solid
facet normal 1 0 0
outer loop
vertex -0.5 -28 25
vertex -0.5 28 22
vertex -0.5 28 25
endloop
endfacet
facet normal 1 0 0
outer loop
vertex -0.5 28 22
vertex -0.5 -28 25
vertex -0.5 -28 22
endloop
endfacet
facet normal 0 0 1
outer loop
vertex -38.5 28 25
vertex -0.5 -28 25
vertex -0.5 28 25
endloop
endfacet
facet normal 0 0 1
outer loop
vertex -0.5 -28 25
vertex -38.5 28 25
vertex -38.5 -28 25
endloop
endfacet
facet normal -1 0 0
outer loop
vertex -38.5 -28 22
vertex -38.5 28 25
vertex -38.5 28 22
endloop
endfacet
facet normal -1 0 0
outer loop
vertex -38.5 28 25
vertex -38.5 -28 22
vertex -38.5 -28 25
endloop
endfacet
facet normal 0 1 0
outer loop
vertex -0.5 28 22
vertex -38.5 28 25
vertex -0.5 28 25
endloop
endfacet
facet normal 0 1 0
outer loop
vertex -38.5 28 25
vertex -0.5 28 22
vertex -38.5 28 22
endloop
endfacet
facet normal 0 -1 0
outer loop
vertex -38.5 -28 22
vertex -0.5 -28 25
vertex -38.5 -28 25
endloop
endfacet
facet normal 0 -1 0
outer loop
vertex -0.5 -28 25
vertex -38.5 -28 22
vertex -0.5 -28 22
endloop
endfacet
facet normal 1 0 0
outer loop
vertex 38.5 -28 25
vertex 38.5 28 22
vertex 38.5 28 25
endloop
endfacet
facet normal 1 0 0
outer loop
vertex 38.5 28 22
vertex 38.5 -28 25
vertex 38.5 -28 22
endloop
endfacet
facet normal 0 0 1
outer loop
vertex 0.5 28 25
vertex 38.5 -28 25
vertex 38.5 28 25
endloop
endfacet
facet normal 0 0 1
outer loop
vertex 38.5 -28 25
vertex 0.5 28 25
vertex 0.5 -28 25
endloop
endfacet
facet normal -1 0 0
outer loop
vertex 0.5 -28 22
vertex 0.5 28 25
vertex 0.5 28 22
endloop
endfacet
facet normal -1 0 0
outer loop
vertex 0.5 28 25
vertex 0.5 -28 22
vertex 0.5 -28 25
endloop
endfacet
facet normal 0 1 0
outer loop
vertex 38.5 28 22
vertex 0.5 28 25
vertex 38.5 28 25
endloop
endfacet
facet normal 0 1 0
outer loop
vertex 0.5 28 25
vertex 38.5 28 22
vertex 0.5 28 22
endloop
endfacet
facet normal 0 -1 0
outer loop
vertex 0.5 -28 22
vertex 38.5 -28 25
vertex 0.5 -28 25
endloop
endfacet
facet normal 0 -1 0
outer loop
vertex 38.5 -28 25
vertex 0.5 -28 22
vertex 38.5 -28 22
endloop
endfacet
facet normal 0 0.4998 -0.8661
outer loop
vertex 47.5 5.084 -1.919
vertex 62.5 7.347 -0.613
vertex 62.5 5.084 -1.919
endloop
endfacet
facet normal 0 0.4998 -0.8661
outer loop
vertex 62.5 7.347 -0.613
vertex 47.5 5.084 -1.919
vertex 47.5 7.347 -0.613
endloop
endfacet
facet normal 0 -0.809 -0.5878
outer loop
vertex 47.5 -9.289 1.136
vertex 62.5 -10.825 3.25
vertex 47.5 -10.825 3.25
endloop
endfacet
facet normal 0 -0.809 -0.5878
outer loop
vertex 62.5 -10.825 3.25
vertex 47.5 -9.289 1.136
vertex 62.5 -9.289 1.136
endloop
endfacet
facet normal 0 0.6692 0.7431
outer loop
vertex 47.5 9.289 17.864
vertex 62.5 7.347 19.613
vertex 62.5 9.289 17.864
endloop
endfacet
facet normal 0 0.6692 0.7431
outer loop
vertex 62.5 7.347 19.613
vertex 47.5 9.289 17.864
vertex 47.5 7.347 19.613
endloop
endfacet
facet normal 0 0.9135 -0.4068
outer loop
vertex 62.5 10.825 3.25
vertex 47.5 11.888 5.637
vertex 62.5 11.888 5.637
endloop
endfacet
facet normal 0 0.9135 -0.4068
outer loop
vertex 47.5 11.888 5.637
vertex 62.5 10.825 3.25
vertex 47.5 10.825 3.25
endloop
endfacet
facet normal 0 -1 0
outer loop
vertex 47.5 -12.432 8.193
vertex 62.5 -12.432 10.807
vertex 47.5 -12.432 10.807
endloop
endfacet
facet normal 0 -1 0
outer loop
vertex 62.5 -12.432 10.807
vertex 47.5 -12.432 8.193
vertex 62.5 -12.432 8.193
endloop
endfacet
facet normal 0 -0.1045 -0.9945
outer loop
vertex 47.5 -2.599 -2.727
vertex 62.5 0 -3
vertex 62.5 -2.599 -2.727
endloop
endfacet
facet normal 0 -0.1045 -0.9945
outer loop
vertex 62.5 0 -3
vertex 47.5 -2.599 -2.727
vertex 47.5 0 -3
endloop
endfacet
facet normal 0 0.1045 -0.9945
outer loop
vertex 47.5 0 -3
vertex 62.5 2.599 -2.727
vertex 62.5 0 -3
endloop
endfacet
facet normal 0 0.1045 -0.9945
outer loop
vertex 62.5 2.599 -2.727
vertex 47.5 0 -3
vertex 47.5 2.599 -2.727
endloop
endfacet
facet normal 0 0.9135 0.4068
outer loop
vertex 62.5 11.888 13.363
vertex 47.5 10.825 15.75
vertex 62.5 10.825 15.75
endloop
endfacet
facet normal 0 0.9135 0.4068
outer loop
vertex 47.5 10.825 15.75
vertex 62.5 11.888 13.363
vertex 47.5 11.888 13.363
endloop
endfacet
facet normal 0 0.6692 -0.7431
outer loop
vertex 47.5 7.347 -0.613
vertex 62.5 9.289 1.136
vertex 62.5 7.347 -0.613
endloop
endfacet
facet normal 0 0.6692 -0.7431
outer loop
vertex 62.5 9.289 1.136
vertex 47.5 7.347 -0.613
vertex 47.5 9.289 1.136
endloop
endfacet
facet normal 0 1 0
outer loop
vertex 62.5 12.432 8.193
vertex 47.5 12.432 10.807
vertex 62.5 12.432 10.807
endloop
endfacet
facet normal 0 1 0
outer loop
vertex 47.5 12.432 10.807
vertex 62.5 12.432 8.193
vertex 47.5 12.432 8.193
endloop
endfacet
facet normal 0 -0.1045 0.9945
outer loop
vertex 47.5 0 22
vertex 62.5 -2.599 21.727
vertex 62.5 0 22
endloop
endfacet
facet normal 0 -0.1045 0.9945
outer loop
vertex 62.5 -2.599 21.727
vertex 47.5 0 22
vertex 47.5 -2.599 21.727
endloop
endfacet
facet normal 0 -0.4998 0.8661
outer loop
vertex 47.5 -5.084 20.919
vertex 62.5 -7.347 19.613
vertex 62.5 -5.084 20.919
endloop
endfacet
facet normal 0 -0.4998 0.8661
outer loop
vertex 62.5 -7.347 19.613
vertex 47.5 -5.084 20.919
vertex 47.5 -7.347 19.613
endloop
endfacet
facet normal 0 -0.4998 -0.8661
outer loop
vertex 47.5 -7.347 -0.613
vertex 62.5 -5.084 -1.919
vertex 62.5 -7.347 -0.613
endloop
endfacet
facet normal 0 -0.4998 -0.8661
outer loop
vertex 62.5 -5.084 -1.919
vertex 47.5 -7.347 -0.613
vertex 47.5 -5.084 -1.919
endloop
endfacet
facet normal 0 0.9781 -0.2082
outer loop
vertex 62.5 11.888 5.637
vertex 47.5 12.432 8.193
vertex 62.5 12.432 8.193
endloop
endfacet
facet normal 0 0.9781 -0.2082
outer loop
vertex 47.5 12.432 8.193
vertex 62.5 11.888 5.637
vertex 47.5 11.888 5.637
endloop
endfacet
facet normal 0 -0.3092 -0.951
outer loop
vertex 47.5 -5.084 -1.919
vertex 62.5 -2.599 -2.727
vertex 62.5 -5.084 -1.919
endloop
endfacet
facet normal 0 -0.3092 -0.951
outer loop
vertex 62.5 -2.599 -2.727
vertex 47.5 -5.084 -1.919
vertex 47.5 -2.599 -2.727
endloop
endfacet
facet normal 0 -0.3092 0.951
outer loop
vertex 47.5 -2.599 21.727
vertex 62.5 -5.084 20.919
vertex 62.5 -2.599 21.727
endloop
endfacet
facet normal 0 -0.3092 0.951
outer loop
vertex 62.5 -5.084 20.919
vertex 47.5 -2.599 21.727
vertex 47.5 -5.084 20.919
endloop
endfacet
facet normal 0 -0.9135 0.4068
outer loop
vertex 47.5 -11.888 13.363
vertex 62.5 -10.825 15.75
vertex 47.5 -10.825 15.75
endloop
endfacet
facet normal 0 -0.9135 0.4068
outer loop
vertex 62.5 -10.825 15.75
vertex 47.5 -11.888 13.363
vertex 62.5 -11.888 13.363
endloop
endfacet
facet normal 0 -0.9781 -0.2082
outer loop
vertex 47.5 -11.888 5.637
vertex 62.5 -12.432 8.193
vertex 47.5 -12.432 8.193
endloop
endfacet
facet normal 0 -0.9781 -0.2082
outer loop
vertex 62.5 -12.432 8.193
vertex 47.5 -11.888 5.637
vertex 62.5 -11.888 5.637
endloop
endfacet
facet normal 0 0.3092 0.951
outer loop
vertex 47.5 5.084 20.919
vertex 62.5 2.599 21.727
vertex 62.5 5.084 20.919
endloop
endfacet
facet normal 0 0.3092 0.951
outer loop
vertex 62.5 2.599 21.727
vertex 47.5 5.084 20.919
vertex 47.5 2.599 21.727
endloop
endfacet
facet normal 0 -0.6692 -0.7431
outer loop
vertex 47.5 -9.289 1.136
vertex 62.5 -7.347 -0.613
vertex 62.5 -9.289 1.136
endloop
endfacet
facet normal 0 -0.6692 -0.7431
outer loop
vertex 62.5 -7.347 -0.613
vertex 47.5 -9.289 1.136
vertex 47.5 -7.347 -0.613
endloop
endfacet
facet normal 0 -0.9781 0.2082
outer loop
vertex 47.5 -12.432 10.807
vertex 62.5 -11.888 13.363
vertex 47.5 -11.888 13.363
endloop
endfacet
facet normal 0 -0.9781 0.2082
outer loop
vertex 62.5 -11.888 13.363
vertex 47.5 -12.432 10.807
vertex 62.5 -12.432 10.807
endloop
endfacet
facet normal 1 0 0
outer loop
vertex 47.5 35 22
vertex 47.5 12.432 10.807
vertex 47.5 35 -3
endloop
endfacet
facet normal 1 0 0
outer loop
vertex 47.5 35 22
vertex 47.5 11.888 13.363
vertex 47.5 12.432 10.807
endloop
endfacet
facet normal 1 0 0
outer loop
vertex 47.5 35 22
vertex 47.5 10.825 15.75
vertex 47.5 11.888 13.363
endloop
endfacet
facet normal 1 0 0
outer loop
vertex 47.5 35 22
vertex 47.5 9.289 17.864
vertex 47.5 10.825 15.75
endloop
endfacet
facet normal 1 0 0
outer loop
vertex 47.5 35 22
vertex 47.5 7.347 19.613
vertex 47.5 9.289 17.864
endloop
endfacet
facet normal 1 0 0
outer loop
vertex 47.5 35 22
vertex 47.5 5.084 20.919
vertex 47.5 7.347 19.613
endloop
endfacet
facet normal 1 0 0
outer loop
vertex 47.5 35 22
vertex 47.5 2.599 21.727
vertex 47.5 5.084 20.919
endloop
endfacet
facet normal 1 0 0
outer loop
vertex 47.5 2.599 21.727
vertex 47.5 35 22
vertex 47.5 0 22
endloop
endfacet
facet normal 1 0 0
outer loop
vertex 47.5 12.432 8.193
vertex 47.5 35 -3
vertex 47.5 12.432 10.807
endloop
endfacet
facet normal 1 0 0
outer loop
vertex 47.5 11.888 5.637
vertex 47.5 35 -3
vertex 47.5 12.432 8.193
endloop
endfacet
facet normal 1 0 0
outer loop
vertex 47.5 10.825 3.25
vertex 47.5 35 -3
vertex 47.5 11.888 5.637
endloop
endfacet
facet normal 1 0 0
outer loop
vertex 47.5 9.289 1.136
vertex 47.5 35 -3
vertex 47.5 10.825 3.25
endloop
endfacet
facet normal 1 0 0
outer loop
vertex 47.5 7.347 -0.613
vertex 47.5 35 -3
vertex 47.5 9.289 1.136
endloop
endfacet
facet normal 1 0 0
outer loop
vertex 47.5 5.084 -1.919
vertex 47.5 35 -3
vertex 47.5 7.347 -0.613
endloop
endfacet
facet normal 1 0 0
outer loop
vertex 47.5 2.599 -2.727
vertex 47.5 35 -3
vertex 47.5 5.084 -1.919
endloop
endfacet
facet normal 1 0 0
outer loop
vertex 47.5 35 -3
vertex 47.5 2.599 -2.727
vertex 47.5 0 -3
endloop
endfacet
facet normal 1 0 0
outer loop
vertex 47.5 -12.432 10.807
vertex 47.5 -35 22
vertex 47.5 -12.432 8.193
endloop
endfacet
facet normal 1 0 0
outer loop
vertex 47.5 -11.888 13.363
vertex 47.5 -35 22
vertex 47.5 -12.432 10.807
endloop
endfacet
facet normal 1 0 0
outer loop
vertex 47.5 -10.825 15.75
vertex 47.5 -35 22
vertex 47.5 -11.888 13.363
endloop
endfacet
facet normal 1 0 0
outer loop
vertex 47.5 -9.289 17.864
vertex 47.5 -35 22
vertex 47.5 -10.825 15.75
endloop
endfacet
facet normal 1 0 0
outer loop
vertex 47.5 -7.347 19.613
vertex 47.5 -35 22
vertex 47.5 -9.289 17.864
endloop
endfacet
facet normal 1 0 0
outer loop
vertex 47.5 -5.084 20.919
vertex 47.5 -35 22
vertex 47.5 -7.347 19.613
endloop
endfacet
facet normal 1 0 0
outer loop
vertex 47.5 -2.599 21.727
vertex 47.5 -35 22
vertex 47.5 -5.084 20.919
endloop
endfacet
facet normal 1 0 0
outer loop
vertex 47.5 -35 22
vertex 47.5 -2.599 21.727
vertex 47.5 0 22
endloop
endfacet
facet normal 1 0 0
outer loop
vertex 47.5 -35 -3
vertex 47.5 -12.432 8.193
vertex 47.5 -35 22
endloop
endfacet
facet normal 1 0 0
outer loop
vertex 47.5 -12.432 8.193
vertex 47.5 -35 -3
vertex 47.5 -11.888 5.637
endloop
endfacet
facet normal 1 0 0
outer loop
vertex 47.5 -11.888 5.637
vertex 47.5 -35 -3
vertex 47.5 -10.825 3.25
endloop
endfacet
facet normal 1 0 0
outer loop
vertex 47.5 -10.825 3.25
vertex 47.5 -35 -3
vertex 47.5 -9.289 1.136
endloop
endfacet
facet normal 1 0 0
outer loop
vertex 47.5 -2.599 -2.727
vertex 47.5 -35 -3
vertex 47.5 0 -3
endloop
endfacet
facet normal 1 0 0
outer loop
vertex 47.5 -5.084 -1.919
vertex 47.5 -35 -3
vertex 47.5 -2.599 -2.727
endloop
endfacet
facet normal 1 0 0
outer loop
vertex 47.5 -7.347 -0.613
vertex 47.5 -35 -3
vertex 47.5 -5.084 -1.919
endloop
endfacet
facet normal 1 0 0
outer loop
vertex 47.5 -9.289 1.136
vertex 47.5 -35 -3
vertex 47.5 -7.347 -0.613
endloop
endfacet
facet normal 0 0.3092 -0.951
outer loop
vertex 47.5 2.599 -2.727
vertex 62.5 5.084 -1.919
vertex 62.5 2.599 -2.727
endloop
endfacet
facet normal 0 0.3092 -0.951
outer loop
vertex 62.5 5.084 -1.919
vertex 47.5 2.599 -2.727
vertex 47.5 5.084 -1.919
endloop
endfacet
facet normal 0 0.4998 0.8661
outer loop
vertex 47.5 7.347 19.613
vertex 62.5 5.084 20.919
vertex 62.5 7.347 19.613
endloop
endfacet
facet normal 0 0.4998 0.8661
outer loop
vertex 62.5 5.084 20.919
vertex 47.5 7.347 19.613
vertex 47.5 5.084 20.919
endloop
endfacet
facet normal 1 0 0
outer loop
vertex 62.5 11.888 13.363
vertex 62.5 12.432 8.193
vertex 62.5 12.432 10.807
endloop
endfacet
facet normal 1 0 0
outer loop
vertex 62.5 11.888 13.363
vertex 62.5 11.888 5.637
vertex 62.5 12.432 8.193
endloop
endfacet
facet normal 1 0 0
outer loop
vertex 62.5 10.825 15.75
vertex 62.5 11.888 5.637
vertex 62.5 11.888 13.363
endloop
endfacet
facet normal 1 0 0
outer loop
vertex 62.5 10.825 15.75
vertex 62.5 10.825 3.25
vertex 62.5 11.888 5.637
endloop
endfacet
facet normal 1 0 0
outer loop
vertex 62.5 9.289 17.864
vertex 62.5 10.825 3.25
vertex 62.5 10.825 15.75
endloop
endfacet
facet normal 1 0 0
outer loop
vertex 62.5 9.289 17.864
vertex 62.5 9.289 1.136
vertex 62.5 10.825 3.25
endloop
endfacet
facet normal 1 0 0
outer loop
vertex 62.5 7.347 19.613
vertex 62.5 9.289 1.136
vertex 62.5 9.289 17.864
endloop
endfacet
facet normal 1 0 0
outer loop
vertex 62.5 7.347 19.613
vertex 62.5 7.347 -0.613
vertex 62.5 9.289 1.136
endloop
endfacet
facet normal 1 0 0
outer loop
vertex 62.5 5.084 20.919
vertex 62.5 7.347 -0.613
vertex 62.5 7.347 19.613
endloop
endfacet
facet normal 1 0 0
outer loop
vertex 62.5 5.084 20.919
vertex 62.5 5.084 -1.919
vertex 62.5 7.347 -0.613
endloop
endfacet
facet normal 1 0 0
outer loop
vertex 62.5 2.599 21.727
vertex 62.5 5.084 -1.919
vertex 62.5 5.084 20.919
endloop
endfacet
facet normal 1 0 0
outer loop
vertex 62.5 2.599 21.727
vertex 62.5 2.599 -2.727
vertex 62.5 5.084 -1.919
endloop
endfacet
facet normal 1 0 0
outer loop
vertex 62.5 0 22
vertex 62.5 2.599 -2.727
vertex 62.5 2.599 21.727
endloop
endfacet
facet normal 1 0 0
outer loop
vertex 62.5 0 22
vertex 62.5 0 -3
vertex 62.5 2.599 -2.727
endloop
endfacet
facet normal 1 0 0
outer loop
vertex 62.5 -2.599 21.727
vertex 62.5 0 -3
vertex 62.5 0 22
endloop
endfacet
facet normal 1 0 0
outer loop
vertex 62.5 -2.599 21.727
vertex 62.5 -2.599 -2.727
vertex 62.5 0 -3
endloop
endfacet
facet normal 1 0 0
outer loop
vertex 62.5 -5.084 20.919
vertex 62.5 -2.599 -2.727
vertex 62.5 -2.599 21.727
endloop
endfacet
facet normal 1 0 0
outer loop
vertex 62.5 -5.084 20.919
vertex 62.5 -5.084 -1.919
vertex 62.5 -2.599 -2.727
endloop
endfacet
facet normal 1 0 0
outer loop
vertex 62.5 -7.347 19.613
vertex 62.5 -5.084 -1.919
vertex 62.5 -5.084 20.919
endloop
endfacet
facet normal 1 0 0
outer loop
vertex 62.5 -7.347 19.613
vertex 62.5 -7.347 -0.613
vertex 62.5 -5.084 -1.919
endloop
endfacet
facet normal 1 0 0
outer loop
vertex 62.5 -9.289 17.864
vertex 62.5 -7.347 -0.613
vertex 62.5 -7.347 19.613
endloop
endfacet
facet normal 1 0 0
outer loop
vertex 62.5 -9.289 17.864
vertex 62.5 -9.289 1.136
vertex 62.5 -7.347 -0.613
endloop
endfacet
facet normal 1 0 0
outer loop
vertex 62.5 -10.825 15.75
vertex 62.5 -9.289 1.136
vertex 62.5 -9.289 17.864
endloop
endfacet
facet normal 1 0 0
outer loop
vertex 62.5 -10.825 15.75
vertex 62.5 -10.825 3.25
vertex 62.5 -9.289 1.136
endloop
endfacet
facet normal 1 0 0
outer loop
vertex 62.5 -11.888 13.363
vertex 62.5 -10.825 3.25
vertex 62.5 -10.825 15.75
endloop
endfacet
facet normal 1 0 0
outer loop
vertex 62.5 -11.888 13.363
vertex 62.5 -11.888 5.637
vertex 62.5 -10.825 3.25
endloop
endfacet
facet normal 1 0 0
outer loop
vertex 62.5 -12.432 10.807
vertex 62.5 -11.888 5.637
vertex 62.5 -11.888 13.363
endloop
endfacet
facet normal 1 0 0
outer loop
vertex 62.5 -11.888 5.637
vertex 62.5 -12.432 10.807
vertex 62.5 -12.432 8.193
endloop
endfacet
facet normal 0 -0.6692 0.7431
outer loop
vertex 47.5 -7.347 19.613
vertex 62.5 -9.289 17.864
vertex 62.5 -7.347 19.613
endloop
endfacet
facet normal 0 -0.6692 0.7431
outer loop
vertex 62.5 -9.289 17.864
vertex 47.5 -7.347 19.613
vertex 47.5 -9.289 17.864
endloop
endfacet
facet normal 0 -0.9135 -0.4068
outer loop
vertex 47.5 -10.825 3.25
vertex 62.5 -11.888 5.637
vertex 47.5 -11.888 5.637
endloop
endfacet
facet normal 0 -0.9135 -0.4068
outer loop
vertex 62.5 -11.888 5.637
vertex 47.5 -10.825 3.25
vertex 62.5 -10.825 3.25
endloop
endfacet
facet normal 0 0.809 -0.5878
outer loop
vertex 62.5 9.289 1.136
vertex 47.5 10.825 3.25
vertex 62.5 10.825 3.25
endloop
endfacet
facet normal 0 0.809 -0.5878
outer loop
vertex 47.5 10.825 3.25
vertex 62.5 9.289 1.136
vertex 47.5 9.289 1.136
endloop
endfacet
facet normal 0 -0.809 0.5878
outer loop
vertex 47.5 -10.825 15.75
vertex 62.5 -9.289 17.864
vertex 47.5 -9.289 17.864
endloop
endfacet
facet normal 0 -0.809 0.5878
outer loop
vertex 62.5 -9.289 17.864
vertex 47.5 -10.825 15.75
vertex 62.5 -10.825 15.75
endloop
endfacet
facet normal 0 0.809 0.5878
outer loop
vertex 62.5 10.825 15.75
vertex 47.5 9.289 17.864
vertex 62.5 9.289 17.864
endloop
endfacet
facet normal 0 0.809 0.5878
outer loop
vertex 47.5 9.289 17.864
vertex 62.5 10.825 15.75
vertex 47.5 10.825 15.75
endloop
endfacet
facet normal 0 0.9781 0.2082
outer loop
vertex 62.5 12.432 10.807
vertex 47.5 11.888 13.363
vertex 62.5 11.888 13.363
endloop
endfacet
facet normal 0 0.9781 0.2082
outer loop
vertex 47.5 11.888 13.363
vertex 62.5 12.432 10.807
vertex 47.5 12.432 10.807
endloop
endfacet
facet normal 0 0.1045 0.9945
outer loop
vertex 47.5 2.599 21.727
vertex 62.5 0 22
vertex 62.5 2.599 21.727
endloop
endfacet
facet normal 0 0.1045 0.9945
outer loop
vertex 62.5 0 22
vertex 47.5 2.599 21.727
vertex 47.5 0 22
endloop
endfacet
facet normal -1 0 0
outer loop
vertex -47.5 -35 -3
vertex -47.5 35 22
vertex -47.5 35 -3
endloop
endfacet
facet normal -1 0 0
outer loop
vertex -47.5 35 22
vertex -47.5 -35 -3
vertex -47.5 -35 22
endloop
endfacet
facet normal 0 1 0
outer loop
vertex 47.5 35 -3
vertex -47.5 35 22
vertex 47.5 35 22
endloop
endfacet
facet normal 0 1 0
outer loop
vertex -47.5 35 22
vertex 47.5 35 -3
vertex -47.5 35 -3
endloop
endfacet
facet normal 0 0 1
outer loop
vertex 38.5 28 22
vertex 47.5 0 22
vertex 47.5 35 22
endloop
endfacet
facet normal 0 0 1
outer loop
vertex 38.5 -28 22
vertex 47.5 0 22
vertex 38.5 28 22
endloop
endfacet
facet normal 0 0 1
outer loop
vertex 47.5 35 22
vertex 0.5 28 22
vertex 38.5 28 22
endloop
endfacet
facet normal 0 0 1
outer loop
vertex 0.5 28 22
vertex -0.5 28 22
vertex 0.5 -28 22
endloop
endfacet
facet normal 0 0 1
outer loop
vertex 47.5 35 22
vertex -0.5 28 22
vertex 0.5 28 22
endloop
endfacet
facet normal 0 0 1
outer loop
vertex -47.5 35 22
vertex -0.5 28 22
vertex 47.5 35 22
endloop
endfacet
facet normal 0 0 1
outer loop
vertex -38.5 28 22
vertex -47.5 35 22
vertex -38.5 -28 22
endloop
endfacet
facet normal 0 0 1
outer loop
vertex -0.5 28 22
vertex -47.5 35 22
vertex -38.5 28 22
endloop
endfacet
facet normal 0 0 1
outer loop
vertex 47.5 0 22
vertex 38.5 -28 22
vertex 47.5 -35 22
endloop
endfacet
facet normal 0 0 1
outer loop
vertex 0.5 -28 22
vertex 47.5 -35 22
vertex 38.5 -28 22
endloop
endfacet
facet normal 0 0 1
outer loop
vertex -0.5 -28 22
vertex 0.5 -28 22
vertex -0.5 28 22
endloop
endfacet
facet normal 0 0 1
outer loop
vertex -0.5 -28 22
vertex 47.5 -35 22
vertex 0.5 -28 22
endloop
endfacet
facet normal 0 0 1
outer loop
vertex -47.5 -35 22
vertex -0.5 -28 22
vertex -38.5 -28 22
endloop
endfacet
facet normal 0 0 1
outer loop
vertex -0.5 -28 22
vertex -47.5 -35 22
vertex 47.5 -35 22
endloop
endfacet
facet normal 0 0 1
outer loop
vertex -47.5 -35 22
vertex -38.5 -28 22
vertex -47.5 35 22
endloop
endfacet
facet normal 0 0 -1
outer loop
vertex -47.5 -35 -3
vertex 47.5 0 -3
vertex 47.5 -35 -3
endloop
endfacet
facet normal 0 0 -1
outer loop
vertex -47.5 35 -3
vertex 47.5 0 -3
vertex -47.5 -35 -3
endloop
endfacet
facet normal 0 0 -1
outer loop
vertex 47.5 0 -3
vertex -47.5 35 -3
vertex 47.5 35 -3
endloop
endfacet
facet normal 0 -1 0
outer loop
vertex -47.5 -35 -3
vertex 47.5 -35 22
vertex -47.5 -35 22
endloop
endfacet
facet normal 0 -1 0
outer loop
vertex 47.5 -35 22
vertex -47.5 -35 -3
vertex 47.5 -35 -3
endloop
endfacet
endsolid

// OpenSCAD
// lcd_size=[24, 34, 9];
lcd_size=[38, 56, 11.2];

battery_size=[50, 36, 12];
box_size=[95, 70, 25];
board_size=[lcd_size[0] * 2 + 1, box_size[1]-5, 3];
knob_h=15;
knob_r=12.5;
encoder_size=[15, 15, 15];
buzzer_r=8;
buzzer_h=10;

// battery
translate([-box_size[0]/2, box_size[1]/2 - battery_size[1], 0]) {
    color("black", 0.2) cube(battery_size);
}

// lcd
translate([-lcd_size[0], -lcd_size[1] / 2, box_size[2] - lcd_size[2]]) {
    translate([0 - 0.5, 0, 0]) color("white", 0.5) cube(lcd_size);
    translate([lcd_size[0] + 0.5, 0, 0]) color("white", 0.5) cube(lcd_size);
}

// board
translate([-board_size[0]/2, -board_size[1]/2, box_size[2] - lcd_size[2] - board_size[2]]) {
    color("green", 0.2) cube(board_size);
}

// knob
translate([box_size[0]/2, 0, box_size[2]/2 - 3]) {
    color("red", 0.1) rotate([0, 90, 0]) cylinder(knob_h, knob_r, knob_r);
    color("black") translate([-encoder_size[0], -encoder_size[1]/2 , -encoder_size[2]/2]) cube(encoder_size);
}

// buzzer
translate([0, -box_size[1]/2 + buzzer_r + 5, box_size[2] - lcd_size[2] - board_size[2] - buzzer_h]) {
    color("black", 0.2) cylinder(buzzer_h, buzzer_r, buzzer_r);
}

// box
translate([-box_size[0]/2, -box_size[1]/2, -3]) {
    color("blue", 0.1) cube(box_size);
}
